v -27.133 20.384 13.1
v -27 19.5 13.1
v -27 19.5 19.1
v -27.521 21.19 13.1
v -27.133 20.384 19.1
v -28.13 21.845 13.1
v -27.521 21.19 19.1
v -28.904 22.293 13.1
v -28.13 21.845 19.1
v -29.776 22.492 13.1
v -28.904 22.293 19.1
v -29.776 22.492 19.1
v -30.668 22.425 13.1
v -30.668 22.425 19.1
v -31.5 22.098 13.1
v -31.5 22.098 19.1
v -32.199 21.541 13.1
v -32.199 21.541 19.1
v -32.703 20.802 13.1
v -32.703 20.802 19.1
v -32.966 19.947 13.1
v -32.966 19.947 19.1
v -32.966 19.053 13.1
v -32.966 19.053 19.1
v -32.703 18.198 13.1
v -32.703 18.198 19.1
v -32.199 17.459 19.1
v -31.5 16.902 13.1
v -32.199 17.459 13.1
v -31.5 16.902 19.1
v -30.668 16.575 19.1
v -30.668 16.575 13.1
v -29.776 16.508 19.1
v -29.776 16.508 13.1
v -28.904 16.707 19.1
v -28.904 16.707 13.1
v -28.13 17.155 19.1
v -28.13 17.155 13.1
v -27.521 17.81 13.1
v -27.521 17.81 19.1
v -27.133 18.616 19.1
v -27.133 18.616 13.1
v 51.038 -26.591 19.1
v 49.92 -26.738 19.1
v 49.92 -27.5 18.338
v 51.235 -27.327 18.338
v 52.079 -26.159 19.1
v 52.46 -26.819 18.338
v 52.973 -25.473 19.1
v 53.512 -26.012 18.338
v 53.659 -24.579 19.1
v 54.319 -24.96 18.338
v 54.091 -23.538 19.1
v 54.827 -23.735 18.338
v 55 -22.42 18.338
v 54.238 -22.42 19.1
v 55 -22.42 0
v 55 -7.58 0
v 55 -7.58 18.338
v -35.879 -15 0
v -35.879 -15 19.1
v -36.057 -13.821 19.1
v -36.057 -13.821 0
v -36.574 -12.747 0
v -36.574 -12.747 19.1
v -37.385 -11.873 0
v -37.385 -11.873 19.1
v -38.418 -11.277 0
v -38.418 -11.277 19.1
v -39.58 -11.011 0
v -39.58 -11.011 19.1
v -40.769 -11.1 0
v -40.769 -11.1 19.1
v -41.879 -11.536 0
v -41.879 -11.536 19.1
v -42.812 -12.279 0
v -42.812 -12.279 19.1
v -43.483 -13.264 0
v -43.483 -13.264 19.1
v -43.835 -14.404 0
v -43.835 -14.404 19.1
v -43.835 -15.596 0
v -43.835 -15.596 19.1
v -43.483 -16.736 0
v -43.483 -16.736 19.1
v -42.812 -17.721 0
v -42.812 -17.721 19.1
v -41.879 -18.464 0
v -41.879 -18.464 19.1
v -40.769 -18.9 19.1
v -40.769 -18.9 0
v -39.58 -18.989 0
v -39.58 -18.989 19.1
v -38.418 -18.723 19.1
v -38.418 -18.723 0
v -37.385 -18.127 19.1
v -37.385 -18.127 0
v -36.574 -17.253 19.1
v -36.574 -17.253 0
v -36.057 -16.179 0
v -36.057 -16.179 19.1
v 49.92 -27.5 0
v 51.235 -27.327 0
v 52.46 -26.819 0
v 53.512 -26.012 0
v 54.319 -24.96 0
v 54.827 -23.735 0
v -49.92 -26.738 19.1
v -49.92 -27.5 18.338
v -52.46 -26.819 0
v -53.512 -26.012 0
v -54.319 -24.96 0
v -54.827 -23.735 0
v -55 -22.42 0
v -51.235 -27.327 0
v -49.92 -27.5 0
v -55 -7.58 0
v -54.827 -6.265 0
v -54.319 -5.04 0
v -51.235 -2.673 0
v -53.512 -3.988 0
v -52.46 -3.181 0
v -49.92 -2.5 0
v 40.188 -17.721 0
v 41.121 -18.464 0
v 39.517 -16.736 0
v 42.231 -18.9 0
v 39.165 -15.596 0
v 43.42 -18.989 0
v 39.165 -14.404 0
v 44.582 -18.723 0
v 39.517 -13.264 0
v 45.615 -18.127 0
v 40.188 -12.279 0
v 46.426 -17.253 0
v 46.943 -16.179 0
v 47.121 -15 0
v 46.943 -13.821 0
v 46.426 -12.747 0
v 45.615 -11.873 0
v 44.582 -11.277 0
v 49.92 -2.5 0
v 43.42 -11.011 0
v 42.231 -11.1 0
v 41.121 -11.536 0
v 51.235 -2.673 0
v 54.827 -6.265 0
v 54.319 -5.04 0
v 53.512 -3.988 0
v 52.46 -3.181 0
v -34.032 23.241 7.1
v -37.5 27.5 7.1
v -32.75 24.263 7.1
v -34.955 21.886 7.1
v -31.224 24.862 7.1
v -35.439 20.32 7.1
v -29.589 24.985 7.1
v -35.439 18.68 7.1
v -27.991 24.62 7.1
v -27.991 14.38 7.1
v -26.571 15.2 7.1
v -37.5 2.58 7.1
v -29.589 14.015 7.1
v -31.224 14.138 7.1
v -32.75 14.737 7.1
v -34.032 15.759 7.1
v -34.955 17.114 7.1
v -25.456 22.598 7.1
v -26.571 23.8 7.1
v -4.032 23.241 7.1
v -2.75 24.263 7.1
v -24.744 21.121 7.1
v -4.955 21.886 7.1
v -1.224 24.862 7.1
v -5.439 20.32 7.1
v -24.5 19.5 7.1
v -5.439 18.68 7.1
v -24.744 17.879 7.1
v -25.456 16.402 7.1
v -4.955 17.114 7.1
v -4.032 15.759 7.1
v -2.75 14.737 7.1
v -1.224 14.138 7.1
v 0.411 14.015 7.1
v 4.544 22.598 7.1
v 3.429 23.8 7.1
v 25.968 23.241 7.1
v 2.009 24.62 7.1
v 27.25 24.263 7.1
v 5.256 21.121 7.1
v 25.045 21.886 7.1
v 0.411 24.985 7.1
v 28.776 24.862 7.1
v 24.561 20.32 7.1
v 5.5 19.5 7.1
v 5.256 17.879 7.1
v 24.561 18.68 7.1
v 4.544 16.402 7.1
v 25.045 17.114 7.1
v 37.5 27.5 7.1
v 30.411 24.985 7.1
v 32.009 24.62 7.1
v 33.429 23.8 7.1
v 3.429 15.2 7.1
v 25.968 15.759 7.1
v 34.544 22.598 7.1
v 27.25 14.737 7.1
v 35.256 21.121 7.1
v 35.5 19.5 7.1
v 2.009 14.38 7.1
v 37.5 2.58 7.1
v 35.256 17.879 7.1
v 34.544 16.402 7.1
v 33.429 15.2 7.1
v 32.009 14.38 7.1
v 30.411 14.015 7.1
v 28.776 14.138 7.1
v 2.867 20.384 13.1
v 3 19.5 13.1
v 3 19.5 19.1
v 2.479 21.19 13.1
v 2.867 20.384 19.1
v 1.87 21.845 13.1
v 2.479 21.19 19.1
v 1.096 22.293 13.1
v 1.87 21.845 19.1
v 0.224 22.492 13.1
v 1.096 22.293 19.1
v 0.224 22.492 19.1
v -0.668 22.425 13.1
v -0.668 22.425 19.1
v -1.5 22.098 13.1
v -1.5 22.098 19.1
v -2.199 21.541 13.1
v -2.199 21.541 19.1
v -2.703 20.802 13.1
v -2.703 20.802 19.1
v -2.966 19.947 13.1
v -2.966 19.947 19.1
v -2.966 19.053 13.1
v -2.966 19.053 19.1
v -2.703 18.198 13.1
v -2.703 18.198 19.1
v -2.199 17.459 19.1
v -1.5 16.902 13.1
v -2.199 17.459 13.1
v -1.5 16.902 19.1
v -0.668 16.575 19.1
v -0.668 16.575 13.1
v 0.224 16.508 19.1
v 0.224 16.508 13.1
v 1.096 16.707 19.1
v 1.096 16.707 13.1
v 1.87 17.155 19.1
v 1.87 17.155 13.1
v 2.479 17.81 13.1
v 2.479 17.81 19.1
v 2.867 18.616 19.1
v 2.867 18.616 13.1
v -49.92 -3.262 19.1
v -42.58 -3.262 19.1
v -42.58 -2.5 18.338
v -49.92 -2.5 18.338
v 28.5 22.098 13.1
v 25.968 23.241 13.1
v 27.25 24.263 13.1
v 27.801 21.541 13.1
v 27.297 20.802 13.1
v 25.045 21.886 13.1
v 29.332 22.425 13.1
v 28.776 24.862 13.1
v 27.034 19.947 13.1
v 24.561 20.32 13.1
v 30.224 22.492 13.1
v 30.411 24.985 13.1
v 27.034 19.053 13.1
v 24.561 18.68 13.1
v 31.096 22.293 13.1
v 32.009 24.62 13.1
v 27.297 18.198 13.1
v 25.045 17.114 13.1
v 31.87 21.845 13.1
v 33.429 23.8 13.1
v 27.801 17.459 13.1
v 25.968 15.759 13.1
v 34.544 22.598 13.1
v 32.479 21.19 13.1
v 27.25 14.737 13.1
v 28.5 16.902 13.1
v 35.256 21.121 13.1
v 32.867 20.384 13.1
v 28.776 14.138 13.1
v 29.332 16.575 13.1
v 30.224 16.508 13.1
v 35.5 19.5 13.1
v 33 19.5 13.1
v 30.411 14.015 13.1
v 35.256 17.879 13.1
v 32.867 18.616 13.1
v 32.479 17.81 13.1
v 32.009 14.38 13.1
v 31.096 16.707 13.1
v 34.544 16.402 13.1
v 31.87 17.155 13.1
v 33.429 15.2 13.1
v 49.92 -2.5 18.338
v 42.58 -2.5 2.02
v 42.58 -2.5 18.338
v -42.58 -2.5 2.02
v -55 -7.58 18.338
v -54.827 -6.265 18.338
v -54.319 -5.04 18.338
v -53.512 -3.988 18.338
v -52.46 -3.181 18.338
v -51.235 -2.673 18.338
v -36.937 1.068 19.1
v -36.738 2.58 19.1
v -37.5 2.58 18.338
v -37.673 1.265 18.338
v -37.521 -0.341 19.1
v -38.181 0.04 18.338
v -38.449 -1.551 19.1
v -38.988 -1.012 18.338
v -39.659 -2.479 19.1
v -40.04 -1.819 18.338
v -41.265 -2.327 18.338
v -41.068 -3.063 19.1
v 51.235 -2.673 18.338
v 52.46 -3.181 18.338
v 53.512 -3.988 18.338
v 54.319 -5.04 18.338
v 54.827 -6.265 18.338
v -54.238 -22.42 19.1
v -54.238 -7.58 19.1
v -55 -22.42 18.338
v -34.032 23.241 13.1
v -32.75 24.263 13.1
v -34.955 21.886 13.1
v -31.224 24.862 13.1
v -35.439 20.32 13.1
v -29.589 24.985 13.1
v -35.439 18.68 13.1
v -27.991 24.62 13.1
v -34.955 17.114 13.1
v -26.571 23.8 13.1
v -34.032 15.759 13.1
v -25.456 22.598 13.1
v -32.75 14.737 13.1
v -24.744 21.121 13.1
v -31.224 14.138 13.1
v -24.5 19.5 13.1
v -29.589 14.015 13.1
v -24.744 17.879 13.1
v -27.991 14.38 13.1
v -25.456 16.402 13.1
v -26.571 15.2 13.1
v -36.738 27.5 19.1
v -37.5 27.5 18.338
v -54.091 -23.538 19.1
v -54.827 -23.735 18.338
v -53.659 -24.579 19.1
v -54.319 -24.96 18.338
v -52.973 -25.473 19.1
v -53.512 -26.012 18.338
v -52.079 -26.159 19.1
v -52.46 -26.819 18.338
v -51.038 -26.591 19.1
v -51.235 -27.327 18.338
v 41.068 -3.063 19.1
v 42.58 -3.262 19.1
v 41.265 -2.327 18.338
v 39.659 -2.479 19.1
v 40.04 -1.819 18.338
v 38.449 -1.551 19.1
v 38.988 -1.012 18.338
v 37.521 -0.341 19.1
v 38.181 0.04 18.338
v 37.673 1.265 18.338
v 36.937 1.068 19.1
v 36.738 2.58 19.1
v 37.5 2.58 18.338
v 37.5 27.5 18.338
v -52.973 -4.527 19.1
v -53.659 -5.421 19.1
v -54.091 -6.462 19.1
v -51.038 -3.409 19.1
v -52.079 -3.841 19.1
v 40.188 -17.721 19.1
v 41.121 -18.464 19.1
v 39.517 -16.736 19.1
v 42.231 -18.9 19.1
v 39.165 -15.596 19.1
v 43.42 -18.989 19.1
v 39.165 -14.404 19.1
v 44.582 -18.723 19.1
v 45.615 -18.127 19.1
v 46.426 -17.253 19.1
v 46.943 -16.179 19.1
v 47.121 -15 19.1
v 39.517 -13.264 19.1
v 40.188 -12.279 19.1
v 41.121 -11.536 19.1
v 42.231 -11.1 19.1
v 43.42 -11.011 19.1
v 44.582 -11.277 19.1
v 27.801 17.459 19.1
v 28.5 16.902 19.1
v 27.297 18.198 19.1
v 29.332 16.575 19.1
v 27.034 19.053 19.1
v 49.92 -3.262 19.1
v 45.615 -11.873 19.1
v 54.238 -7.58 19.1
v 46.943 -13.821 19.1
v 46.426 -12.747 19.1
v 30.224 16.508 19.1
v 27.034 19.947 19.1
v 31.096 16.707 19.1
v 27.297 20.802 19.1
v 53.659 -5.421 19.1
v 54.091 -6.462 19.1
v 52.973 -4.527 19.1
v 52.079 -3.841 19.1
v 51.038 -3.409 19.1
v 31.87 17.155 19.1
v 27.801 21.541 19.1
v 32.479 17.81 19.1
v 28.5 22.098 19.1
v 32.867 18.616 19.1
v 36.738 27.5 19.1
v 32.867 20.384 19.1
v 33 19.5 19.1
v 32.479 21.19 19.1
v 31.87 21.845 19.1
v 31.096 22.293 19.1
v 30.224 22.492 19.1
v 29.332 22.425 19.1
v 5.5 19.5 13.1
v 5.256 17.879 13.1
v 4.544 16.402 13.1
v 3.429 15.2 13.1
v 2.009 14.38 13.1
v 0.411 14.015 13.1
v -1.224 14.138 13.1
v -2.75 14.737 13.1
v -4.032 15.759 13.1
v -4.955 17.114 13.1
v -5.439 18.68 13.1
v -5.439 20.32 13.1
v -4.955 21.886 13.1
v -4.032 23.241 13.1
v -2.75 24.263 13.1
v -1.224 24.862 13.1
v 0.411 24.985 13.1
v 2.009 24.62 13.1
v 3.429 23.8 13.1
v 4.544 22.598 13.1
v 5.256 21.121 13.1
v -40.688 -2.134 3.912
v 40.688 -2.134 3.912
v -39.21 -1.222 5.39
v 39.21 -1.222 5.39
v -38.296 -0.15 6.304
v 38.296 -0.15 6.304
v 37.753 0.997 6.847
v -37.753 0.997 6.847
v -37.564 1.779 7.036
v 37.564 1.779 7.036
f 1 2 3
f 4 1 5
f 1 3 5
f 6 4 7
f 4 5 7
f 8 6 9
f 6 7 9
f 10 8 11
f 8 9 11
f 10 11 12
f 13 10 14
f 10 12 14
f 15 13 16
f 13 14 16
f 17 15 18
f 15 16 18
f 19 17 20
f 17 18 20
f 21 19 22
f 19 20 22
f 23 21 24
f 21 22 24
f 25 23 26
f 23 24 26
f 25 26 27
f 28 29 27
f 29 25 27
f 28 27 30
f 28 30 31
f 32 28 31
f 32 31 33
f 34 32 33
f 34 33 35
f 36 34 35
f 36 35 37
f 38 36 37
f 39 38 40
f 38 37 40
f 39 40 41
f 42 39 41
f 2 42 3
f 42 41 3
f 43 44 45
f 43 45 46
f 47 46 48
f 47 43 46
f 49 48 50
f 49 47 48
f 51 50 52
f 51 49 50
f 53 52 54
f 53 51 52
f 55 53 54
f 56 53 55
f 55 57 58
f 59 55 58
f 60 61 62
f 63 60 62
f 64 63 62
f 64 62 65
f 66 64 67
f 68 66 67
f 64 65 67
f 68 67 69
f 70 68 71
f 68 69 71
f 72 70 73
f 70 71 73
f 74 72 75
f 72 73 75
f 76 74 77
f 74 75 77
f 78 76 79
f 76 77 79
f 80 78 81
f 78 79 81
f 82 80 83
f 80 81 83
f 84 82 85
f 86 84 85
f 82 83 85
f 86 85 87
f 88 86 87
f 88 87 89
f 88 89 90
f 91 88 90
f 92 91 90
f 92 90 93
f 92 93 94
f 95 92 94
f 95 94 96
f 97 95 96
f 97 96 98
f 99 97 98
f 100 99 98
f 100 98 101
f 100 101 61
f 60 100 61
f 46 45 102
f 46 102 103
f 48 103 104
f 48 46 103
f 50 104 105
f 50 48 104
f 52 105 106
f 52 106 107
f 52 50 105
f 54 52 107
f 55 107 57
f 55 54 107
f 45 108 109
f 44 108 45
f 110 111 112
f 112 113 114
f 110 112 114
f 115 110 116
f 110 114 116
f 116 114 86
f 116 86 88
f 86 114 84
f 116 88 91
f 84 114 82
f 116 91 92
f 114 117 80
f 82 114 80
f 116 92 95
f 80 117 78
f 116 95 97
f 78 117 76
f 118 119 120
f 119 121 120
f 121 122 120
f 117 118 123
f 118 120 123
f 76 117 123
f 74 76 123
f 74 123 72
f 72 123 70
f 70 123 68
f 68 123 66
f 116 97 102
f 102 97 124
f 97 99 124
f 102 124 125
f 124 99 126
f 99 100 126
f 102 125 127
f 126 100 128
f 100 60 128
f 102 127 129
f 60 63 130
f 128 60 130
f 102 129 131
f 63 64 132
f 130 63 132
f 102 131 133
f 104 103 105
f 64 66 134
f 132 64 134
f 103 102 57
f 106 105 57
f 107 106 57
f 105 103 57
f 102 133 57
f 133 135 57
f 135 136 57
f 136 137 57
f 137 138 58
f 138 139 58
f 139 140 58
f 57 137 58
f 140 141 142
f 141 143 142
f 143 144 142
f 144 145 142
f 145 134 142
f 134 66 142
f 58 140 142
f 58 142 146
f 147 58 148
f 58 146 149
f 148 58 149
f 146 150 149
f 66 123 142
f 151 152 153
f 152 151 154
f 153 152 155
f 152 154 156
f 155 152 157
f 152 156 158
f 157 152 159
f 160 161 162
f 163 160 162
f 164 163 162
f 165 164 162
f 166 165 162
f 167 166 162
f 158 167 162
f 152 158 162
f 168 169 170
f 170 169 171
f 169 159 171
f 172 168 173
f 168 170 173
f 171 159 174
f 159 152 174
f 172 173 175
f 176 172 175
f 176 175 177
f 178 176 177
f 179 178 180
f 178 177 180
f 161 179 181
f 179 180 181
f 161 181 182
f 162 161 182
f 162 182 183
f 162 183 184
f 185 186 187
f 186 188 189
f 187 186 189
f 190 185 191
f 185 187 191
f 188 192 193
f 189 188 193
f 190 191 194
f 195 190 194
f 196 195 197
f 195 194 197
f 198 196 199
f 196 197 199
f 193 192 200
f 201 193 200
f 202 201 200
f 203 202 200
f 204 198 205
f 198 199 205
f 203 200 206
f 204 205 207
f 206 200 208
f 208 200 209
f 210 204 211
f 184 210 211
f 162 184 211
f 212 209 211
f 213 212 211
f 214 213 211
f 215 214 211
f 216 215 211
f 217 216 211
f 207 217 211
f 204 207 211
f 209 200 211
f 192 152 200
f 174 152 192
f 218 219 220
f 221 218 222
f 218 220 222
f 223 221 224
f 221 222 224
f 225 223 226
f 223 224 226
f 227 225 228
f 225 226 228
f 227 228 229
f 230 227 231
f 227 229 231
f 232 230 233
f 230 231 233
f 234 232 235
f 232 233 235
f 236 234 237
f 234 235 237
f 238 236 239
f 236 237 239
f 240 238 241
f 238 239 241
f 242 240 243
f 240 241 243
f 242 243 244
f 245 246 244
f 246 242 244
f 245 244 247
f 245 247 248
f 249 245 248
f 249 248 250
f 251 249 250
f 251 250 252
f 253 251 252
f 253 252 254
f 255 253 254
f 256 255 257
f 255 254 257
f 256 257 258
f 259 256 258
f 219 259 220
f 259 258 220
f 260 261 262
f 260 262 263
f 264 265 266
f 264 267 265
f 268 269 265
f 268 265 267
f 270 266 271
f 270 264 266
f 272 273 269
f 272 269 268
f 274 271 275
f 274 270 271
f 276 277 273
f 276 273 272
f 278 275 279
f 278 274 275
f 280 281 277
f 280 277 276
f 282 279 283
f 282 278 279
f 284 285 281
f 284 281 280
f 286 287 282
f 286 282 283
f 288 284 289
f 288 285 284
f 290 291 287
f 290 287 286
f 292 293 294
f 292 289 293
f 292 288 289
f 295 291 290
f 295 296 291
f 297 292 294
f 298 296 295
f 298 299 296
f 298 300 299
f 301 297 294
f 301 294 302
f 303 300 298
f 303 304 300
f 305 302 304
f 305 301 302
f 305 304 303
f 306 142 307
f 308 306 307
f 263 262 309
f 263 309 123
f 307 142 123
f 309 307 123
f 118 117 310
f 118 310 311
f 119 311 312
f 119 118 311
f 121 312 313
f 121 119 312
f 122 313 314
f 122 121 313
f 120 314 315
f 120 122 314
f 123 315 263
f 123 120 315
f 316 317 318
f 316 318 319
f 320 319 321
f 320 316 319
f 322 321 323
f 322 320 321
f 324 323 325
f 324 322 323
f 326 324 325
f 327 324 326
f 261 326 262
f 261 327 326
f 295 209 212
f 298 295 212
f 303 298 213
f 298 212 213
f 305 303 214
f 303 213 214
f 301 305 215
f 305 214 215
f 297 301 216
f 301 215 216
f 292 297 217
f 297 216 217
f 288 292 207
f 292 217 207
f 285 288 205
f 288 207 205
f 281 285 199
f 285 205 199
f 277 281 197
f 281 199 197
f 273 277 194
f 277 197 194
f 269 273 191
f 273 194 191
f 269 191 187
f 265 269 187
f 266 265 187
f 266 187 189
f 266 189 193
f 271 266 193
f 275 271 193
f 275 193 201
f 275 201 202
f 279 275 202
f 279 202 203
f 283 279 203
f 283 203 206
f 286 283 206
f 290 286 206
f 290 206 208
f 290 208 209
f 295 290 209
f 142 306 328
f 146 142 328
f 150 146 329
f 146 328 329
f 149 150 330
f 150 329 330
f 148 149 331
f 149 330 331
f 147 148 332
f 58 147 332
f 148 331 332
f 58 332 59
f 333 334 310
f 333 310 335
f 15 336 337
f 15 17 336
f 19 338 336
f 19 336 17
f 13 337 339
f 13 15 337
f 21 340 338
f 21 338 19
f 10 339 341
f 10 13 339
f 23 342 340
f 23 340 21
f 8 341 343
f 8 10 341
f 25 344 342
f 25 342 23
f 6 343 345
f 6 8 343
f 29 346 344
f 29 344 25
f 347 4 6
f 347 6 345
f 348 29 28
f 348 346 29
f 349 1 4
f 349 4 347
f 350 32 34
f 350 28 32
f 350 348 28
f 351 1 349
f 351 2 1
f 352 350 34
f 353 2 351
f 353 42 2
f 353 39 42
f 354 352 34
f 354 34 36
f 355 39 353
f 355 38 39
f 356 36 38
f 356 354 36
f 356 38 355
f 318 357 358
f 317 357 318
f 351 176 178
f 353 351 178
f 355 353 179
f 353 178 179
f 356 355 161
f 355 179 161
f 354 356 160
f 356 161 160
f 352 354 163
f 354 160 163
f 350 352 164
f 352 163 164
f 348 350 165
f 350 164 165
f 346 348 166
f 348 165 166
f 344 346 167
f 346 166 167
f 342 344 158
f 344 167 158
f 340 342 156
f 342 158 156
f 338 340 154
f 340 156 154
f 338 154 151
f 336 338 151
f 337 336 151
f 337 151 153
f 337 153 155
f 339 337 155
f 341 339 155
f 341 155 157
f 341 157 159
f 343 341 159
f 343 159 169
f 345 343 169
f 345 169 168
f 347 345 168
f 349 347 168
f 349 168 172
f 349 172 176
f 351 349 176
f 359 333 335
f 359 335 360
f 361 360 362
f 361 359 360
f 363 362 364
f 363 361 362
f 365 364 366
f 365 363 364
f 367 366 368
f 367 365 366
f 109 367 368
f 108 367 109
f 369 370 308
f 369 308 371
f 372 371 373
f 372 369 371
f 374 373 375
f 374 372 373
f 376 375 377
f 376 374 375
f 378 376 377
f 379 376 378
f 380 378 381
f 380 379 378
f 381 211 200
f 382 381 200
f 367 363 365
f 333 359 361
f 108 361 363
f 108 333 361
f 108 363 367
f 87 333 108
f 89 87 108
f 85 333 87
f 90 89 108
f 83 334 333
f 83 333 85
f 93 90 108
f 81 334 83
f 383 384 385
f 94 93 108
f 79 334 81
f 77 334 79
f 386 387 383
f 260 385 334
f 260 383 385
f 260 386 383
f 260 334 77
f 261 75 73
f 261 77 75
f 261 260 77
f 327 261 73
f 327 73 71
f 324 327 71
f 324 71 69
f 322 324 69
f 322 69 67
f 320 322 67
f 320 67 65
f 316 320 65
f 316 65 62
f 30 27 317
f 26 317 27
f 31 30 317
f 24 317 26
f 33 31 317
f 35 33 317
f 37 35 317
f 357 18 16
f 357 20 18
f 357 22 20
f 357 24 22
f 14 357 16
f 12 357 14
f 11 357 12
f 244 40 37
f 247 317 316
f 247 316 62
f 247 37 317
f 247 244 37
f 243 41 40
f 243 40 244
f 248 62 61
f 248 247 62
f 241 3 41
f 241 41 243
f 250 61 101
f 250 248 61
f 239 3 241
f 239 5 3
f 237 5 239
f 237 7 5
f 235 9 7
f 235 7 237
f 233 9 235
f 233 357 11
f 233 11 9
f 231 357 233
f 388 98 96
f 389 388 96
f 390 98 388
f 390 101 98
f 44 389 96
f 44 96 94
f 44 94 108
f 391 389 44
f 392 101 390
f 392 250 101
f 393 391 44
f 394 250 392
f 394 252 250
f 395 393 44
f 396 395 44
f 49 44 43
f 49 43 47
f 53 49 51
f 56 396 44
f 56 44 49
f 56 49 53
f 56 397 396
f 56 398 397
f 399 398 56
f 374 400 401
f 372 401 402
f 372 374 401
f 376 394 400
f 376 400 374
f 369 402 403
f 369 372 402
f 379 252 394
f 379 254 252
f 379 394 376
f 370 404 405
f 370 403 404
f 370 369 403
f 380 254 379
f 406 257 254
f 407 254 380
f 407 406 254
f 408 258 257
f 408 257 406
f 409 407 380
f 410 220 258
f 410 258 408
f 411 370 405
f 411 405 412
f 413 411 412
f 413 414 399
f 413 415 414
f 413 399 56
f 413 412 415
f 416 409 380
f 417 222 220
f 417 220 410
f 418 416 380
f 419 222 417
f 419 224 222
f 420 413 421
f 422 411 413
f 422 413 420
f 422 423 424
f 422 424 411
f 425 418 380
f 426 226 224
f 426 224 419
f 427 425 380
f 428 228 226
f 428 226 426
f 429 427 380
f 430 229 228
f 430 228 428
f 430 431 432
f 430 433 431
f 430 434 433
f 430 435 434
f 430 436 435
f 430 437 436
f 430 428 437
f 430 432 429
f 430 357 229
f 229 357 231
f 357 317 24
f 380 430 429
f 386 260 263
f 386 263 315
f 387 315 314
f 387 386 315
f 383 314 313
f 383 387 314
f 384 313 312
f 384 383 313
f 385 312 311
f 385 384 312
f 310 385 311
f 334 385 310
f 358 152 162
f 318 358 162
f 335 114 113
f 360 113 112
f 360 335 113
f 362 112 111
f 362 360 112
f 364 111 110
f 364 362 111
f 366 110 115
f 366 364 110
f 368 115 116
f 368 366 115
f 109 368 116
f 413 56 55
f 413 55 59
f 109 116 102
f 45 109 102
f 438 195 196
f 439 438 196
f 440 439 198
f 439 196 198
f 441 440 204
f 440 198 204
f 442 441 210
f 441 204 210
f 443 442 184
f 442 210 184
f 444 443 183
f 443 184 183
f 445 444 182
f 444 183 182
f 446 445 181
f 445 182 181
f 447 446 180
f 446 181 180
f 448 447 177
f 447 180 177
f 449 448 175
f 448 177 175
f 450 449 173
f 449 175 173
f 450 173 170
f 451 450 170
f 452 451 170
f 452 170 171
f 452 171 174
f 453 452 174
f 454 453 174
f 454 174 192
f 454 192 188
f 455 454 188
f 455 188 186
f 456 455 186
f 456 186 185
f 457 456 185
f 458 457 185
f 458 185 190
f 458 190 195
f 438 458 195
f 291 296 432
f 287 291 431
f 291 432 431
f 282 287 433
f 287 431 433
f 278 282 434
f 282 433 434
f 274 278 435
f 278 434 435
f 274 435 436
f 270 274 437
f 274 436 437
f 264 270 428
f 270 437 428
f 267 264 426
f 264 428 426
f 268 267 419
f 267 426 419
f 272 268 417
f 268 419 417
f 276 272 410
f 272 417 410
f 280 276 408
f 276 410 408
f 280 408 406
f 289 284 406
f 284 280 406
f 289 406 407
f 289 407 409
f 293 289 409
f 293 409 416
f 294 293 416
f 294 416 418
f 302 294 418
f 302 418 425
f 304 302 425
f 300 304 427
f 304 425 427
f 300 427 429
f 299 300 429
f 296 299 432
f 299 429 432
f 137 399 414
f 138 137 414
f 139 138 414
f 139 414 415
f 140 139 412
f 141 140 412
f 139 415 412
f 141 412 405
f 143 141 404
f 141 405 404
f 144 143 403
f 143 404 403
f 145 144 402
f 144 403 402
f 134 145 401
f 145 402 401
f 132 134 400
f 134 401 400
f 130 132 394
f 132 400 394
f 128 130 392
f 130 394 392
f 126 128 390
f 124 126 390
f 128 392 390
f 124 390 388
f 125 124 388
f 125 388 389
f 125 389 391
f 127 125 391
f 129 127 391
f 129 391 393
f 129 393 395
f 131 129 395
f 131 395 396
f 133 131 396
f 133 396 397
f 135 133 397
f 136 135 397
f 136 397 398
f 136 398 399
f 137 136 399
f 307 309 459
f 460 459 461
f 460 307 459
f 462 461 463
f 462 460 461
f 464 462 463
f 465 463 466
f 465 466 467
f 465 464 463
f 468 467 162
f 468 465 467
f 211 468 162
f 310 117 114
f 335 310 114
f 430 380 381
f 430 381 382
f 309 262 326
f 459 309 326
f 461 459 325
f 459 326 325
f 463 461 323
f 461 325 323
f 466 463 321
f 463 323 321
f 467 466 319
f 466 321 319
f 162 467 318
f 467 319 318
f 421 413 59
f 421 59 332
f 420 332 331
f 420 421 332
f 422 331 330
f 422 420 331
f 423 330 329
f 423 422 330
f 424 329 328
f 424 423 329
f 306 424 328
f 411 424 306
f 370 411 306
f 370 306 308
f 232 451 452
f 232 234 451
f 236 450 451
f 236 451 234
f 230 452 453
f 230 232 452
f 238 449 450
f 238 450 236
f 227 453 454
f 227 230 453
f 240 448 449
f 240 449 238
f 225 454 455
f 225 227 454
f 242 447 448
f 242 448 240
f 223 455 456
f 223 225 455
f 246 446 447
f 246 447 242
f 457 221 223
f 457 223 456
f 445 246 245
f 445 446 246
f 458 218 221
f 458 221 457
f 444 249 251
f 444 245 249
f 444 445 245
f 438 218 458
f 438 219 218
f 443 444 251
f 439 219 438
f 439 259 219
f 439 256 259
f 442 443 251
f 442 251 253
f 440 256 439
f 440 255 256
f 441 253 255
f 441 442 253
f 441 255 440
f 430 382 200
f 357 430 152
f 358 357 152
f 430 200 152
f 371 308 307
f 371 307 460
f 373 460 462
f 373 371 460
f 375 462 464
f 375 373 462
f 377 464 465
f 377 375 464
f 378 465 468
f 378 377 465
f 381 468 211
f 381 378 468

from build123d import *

# Parameters (mm, degrees)
F1_DEPTH = 19.1
F2_R     = 3
F3_DEPTH = 19.101
F4_R     = 5.5
F4_R_2   = 3
F5_DEPTH = 13.1
F7_DEPTH = 92.501
F8_R     = 4
F9_DEPTH = 19.101
F10_R    = 5.08
F11_R    = 5.08
F12_SIZE = 0.762


with BuildPart() as f1:
    # F0 (on Top) → F1 (new body)
    with BuildSketch(Plane.XY):
        Polygon((-55, -2.5), (-55, -27.5), (55, -27.5), (55, -2.5), (37.5, -2.5), (37.5, 27.5), (-37.5, 27.5), (-37.5, -2.5), align=None)
    extrude(amount=F1_DEPTH)

    # F2 (on face) → F3 (cut, through all)
    with BuildSketch(Plane.XY.offset(19.1)):
        with Locations((-30, 19.5)):
            Circle(F2_R)
        with Locations((0, 19.5)):
            Circle(F2_R)
        with Locations((30, 19.5)):
            Circle(F2_R)
    extrude(amount=-F3_DEPTH, mode=Mode.SUBTRACT)

    # F4 (on face) → F5 (cut)
    with BuildSketch(Plane(origin=(0, 0, 0), x_dir=(1, 0, 0), z_dir=(0, 0, -1))):
        with Locations((-30, -19.5)):
            Circle(F4_R)
        with Locations((-30, -19.5)):
            Circle(F4_R_2, mode=Mode.SUBTRACT)
        with Locations((0, -19.5)):
            Circle(F4_R)
        with Locations((0, -19.5)):
            Circle(F4_R_2, mode=Mode.SUBTRACT)
        with Locations((30, -19.5)):
            Circle(F4_R)
        with Locations((30, -19.5)):
            Circle(F4_R_2, mode=Mode.SUBTRACT)
    extrude(amount=-F5_DEPTH, mode=Mode.SUBTRACT)

    # F6 (on face) → F7 (cut, through all)
    with BuildSketch(Plane.YZ.offset(37.5)):
        Polygon((27.5, 7.1), (14.2632350326, 7.1), (-2.5, 7.1), (-2.5, 0), (27.5, 0), align=None)
    extrude(amount=-F7_DEPTH, mode=Mode.SUBTRACT)

    # F8 (on face) → F9 (cut, through all)
    with BuildSketch(Plane.XY.offset(19.1)):
        with Locations((-39.879388541, -15)):
            Circle(F8_R)
        with Locations((43.120611459, -15)):
            Circle(F8_R)
    extrude(amount=-F9_DEPTH, mode=Mode.SUBTRACT)

    # F10
    f10_edges = [f1.edges().sort_by_distance(p)[0] for p in [
        (55, -2.5, 9.55),
        (37.5, -2.5, 13.1),
        (-37.5, -2.5, 13.1),
        (-55, -2.5, 9.55),
        (55, -27.5, 9.55),
        (-55, -27.5, 9.55),
    ]]
    fillet(f10_edges, radius=F10_R)

    # F11
    f11_edges = [f1.edges().sort_by_distance(p)[0] for p in [
        (0, -2.5, 7.1),
    ]]
    fillet(f11_edges, radius=F11_R)

    # F12
    f12_edges = [f1.edges().sort_by_distance(p)[0] for p in [
        (0, -27.5, 19.1),
    ]]
    chamfer(f12_edges, length=F12_SIZE)


solid = f1.part
